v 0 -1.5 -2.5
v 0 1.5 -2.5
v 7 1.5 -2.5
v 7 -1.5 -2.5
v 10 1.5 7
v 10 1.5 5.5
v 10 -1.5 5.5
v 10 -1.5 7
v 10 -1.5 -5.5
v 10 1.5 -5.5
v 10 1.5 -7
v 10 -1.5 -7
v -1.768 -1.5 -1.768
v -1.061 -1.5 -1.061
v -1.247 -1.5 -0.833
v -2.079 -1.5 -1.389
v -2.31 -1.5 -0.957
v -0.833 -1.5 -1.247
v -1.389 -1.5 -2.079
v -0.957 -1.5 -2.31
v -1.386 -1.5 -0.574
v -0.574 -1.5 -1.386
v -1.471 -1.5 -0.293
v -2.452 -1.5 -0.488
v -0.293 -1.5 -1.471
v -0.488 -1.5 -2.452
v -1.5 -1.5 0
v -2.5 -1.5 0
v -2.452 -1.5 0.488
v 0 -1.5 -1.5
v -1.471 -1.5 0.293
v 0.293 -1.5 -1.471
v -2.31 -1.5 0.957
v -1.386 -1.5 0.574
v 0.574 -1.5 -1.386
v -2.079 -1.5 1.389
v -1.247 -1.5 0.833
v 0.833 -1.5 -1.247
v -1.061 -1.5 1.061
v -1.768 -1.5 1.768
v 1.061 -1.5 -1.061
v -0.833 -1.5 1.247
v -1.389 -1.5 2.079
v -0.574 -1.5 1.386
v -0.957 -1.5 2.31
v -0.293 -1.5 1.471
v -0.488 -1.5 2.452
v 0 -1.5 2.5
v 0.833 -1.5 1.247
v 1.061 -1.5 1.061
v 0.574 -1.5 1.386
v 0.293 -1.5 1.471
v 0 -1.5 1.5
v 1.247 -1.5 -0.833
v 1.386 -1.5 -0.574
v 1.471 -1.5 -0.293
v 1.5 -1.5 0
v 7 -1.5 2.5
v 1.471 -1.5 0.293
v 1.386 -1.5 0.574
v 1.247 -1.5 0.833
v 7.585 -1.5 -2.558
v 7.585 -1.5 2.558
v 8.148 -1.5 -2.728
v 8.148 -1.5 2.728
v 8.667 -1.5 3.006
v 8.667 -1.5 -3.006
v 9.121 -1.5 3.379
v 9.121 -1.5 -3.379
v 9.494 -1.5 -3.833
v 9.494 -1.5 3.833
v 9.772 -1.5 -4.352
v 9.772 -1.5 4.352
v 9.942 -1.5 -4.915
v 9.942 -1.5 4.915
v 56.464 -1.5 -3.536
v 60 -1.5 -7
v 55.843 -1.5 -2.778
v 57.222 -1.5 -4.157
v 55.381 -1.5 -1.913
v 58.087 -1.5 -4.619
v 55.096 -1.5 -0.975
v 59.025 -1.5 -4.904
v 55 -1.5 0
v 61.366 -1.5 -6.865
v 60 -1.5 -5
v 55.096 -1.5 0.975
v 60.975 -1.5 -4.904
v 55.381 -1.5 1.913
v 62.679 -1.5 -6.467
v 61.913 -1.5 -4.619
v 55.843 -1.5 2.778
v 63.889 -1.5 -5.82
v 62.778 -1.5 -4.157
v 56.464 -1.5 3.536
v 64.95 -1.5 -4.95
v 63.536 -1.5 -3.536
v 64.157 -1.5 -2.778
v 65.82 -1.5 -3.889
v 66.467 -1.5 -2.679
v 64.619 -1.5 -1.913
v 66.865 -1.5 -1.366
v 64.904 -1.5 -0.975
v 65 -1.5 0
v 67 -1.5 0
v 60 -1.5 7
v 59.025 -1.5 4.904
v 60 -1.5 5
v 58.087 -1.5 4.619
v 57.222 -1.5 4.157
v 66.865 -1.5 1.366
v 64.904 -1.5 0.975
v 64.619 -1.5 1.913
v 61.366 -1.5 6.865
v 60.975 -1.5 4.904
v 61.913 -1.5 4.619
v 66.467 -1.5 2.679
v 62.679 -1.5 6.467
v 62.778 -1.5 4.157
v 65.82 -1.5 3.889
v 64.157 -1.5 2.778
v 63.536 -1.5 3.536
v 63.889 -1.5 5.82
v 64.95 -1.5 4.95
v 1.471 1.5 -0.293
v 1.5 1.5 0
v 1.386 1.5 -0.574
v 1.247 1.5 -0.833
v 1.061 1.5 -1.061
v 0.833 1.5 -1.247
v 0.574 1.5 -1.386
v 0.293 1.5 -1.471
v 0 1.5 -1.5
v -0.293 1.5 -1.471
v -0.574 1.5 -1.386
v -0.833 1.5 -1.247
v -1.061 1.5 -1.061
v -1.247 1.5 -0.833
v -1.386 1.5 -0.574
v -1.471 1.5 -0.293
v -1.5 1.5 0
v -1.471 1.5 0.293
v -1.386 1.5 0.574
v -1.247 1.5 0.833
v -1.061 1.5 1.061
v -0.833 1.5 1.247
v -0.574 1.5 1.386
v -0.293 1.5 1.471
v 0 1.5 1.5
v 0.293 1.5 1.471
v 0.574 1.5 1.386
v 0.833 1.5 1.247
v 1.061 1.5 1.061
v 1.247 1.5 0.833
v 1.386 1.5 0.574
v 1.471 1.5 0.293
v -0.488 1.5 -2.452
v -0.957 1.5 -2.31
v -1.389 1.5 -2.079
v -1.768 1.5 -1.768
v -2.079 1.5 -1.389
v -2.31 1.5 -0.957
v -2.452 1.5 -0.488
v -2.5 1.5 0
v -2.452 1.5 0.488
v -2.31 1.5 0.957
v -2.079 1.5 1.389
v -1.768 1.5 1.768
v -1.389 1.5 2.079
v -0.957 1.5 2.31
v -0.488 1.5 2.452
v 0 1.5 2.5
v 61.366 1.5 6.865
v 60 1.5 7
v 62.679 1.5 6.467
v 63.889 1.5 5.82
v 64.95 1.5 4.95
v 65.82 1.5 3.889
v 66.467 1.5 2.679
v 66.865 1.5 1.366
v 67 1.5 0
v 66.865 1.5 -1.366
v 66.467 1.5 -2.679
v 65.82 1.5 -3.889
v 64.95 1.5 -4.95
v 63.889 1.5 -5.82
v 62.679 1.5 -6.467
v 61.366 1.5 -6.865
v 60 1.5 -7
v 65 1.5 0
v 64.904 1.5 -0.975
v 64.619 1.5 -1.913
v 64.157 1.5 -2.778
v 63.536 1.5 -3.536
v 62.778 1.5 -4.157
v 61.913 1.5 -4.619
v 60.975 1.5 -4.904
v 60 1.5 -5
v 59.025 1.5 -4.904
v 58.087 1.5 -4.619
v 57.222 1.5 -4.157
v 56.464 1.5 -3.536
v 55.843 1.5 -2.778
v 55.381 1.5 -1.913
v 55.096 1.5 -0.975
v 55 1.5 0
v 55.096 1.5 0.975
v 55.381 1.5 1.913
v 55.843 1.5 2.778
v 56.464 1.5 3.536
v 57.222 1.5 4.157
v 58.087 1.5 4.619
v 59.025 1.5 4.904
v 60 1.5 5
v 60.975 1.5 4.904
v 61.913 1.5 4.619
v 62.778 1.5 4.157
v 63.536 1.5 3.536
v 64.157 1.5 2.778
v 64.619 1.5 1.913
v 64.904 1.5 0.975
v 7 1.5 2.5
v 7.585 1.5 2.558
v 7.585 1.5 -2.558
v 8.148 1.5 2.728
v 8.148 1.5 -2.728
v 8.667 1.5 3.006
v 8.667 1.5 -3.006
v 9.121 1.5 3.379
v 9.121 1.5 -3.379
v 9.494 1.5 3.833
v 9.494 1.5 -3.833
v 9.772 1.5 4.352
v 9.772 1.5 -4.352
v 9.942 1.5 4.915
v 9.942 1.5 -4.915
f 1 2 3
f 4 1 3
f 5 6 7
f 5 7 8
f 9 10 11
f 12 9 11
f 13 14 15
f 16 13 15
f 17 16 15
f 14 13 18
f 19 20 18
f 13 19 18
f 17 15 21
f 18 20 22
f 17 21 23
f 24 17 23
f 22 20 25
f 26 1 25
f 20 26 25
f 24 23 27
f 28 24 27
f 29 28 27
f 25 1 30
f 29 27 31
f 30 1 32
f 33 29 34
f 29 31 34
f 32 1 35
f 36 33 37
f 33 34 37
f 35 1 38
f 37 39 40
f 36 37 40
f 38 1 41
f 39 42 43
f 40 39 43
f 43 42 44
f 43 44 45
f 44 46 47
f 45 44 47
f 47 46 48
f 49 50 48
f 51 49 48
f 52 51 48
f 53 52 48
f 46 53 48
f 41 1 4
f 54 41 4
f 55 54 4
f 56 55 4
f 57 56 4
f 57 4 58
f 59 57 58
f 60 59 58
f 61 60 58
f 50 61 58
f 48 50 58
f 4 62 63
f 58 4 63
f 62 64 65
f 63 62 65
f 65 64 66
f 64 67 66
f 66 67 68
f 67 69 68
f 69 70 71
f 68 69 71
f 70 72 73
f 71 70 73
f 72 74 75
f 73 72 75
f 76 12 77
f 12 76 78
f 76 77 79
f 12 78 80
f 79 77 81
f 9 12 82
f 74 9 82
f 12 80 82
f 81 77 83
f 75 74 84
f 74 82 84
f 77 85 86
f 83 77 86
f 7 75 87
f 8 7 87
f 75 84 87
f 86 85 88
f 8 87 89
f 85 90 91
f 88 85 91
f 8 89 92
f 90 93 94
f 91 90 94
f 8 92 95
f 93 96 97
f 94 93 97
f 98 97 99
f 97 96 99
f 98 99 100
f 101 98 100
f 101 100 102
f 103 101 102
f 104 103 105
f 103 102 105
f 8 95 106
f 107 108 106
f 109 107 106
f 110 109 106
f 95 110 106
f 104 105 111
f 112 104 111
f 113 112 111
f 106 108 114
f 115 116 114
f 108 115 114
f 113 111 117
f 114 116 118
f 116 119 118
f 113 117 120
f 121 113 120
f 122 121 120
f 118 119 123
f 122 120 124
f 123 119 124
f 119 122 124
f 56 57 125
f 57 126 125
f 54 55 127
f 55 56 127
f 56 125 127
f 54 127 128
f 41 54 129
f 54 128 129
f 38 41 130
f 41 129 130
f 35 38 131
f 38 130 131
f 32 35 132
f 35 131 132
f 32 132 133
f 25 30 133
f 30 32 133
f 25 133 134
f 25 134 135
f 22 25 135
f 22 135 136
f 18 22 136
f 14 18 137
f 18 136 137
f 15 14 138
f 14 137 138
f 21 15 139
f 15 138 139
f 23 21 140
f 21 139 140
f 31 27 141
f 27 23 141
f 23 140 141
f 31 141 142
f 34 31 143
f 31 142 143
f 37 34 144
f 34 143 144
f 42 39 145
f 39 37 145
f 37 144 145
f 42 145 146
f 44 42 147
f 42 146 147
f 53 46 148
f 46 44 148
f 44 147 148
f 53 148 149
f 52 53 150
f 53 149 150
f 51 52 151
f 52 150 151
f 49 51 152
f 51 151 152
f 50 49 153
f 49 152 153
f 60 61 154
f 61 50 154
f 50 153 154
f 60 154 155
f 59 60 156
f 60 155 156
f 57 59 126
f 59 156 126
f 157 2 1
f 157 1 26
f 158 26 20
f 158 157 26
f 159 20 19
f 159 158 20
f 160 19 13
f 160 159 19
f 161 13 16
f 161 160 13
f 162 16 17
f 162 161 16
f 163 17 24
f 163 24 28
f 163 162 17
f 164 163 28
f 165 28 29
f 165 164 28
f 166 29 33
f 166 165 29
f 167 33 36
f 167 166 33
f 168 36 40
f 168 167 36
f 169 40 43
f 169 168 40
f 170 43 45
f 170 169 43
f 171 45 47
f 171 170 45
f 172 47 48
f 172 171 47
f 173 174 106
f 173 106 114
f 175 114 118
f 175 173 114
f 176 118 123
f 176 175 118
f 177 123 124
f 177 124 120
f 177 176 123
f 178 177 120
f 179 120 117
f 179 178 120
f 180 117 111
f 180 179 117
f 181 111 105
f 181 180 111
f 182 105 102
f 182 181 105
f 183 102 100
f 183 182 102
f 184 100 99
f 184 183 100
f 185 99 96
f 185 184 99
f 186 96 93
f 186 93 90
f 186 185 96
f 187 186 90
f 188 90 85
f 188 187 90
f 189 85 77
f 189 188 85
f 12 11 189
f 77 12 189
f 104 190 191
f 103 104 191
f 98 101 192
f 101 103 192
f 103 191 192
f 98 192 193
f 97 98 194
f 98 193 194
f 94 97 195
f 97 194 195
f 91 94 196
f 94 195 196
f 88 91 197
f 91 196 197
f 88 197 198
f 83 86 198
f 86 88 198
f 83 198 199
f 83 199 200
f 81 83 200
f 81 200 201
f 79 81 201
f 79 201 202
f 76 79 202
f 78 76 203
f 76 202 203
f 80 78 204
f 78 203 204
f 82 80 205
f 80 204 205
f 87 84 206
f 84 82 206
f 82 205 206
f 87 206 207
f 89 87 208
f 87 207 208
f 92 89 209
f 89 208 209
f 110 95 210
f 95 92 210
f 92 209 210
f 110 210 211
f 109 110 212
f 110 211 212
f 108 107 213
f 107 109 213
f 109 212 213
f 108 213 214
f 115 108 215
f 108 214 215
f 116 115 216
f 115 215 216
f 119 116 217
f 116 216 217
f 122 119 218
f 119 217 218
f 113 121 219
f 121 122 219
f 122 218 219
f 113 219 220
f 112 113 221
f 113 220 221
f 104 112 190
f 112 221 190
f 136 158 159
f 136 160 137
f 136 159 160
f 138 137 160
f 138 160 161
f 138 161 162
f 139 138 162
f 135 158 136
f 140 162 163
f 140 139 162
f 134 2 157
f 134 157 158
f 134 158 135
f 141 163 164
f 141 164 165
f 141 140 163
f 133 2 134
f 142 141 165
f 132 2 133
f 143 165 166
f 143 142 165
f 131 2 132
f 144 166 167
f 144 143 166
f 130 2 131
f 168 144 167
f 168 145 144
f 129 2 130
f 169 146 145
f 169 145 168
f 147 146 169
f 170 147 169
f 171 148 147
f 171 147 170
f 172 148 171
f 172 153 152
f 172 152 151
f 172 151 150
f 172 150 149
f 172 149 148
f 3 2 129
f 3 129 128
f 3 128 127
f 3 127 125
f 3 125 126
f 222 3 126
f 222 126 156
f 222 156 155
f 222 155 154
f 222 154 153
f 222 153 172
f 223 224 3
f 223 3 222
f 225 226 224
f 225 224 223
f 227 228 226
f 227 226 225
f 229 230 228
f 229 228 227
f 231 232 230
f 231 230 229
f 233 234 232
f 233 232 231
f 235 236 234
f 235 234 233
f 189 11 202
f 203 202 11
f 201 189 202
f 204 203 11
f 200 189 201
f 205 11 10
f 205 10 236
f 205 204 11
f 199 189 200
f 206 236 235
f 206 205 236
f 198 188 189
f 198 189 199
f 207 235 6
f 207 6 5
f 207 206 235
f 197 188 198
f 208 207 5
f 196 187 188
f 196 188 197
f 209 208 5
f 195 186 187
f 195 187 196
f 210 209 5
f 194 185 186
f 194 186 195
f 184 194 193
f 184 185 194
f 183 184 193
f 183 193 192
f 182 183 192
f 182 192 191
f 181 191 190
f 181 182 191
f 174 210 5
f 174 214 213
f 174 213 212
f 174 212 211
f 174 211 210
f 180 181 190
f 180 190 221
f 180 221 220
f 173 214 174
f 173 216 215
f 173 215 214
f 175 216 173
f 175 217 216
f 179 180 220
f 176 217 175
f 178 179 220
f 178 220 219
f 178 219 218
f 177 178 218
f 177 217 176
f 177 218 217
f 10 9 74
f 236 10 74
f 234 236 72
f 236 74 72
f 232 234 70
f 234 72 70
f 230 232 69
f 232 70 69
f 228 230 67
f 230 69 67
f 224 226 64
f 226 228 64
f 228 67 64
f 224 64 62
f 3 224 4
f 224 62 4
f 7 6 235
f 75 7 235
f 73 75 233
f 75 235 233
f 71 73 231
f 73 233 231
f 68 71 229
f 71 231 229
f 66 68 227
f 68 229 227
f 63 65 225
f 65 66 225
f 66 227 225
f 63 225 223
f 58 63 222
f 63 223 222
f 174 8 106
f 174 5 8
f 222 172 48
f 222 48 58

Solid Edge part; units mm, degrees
sketch "Sketch1" plane through (0, 0, 0) normal (0, -1, 0) x (1, 0, 0)
  circle A0 centre (0, 0) radius 1.5
  line L0 (0, 2.5) -> (10, 2.5)
  line L1 (10, 2.5) -> (10, 7)
  line L2 (10, 7) -> (60, 7)
  line L3 (10, -7) -> (60, -7)
  line L4 (10, -2.5) -> (10, -7)
  line L5 (0, -2.5) -> (10, -2.5)
  arc A1 (0, -2.5) -> (0, 2.5) centre (0, 0) cw
  arc A2 (60, 7) -> (60, -7) centre (60, 0) cw
  circle A3 centre (60, 0) radius 5
extrude "Protrusion1" add sketch "Sketch1" along normal mid plane 3
fillet "Redondeo_1" radius 3 2 edges at (10, 0, 2.5) (10, 0, -2.5)
properties part number "1976-1500-003" material "Aluminio, 7075-T6"
